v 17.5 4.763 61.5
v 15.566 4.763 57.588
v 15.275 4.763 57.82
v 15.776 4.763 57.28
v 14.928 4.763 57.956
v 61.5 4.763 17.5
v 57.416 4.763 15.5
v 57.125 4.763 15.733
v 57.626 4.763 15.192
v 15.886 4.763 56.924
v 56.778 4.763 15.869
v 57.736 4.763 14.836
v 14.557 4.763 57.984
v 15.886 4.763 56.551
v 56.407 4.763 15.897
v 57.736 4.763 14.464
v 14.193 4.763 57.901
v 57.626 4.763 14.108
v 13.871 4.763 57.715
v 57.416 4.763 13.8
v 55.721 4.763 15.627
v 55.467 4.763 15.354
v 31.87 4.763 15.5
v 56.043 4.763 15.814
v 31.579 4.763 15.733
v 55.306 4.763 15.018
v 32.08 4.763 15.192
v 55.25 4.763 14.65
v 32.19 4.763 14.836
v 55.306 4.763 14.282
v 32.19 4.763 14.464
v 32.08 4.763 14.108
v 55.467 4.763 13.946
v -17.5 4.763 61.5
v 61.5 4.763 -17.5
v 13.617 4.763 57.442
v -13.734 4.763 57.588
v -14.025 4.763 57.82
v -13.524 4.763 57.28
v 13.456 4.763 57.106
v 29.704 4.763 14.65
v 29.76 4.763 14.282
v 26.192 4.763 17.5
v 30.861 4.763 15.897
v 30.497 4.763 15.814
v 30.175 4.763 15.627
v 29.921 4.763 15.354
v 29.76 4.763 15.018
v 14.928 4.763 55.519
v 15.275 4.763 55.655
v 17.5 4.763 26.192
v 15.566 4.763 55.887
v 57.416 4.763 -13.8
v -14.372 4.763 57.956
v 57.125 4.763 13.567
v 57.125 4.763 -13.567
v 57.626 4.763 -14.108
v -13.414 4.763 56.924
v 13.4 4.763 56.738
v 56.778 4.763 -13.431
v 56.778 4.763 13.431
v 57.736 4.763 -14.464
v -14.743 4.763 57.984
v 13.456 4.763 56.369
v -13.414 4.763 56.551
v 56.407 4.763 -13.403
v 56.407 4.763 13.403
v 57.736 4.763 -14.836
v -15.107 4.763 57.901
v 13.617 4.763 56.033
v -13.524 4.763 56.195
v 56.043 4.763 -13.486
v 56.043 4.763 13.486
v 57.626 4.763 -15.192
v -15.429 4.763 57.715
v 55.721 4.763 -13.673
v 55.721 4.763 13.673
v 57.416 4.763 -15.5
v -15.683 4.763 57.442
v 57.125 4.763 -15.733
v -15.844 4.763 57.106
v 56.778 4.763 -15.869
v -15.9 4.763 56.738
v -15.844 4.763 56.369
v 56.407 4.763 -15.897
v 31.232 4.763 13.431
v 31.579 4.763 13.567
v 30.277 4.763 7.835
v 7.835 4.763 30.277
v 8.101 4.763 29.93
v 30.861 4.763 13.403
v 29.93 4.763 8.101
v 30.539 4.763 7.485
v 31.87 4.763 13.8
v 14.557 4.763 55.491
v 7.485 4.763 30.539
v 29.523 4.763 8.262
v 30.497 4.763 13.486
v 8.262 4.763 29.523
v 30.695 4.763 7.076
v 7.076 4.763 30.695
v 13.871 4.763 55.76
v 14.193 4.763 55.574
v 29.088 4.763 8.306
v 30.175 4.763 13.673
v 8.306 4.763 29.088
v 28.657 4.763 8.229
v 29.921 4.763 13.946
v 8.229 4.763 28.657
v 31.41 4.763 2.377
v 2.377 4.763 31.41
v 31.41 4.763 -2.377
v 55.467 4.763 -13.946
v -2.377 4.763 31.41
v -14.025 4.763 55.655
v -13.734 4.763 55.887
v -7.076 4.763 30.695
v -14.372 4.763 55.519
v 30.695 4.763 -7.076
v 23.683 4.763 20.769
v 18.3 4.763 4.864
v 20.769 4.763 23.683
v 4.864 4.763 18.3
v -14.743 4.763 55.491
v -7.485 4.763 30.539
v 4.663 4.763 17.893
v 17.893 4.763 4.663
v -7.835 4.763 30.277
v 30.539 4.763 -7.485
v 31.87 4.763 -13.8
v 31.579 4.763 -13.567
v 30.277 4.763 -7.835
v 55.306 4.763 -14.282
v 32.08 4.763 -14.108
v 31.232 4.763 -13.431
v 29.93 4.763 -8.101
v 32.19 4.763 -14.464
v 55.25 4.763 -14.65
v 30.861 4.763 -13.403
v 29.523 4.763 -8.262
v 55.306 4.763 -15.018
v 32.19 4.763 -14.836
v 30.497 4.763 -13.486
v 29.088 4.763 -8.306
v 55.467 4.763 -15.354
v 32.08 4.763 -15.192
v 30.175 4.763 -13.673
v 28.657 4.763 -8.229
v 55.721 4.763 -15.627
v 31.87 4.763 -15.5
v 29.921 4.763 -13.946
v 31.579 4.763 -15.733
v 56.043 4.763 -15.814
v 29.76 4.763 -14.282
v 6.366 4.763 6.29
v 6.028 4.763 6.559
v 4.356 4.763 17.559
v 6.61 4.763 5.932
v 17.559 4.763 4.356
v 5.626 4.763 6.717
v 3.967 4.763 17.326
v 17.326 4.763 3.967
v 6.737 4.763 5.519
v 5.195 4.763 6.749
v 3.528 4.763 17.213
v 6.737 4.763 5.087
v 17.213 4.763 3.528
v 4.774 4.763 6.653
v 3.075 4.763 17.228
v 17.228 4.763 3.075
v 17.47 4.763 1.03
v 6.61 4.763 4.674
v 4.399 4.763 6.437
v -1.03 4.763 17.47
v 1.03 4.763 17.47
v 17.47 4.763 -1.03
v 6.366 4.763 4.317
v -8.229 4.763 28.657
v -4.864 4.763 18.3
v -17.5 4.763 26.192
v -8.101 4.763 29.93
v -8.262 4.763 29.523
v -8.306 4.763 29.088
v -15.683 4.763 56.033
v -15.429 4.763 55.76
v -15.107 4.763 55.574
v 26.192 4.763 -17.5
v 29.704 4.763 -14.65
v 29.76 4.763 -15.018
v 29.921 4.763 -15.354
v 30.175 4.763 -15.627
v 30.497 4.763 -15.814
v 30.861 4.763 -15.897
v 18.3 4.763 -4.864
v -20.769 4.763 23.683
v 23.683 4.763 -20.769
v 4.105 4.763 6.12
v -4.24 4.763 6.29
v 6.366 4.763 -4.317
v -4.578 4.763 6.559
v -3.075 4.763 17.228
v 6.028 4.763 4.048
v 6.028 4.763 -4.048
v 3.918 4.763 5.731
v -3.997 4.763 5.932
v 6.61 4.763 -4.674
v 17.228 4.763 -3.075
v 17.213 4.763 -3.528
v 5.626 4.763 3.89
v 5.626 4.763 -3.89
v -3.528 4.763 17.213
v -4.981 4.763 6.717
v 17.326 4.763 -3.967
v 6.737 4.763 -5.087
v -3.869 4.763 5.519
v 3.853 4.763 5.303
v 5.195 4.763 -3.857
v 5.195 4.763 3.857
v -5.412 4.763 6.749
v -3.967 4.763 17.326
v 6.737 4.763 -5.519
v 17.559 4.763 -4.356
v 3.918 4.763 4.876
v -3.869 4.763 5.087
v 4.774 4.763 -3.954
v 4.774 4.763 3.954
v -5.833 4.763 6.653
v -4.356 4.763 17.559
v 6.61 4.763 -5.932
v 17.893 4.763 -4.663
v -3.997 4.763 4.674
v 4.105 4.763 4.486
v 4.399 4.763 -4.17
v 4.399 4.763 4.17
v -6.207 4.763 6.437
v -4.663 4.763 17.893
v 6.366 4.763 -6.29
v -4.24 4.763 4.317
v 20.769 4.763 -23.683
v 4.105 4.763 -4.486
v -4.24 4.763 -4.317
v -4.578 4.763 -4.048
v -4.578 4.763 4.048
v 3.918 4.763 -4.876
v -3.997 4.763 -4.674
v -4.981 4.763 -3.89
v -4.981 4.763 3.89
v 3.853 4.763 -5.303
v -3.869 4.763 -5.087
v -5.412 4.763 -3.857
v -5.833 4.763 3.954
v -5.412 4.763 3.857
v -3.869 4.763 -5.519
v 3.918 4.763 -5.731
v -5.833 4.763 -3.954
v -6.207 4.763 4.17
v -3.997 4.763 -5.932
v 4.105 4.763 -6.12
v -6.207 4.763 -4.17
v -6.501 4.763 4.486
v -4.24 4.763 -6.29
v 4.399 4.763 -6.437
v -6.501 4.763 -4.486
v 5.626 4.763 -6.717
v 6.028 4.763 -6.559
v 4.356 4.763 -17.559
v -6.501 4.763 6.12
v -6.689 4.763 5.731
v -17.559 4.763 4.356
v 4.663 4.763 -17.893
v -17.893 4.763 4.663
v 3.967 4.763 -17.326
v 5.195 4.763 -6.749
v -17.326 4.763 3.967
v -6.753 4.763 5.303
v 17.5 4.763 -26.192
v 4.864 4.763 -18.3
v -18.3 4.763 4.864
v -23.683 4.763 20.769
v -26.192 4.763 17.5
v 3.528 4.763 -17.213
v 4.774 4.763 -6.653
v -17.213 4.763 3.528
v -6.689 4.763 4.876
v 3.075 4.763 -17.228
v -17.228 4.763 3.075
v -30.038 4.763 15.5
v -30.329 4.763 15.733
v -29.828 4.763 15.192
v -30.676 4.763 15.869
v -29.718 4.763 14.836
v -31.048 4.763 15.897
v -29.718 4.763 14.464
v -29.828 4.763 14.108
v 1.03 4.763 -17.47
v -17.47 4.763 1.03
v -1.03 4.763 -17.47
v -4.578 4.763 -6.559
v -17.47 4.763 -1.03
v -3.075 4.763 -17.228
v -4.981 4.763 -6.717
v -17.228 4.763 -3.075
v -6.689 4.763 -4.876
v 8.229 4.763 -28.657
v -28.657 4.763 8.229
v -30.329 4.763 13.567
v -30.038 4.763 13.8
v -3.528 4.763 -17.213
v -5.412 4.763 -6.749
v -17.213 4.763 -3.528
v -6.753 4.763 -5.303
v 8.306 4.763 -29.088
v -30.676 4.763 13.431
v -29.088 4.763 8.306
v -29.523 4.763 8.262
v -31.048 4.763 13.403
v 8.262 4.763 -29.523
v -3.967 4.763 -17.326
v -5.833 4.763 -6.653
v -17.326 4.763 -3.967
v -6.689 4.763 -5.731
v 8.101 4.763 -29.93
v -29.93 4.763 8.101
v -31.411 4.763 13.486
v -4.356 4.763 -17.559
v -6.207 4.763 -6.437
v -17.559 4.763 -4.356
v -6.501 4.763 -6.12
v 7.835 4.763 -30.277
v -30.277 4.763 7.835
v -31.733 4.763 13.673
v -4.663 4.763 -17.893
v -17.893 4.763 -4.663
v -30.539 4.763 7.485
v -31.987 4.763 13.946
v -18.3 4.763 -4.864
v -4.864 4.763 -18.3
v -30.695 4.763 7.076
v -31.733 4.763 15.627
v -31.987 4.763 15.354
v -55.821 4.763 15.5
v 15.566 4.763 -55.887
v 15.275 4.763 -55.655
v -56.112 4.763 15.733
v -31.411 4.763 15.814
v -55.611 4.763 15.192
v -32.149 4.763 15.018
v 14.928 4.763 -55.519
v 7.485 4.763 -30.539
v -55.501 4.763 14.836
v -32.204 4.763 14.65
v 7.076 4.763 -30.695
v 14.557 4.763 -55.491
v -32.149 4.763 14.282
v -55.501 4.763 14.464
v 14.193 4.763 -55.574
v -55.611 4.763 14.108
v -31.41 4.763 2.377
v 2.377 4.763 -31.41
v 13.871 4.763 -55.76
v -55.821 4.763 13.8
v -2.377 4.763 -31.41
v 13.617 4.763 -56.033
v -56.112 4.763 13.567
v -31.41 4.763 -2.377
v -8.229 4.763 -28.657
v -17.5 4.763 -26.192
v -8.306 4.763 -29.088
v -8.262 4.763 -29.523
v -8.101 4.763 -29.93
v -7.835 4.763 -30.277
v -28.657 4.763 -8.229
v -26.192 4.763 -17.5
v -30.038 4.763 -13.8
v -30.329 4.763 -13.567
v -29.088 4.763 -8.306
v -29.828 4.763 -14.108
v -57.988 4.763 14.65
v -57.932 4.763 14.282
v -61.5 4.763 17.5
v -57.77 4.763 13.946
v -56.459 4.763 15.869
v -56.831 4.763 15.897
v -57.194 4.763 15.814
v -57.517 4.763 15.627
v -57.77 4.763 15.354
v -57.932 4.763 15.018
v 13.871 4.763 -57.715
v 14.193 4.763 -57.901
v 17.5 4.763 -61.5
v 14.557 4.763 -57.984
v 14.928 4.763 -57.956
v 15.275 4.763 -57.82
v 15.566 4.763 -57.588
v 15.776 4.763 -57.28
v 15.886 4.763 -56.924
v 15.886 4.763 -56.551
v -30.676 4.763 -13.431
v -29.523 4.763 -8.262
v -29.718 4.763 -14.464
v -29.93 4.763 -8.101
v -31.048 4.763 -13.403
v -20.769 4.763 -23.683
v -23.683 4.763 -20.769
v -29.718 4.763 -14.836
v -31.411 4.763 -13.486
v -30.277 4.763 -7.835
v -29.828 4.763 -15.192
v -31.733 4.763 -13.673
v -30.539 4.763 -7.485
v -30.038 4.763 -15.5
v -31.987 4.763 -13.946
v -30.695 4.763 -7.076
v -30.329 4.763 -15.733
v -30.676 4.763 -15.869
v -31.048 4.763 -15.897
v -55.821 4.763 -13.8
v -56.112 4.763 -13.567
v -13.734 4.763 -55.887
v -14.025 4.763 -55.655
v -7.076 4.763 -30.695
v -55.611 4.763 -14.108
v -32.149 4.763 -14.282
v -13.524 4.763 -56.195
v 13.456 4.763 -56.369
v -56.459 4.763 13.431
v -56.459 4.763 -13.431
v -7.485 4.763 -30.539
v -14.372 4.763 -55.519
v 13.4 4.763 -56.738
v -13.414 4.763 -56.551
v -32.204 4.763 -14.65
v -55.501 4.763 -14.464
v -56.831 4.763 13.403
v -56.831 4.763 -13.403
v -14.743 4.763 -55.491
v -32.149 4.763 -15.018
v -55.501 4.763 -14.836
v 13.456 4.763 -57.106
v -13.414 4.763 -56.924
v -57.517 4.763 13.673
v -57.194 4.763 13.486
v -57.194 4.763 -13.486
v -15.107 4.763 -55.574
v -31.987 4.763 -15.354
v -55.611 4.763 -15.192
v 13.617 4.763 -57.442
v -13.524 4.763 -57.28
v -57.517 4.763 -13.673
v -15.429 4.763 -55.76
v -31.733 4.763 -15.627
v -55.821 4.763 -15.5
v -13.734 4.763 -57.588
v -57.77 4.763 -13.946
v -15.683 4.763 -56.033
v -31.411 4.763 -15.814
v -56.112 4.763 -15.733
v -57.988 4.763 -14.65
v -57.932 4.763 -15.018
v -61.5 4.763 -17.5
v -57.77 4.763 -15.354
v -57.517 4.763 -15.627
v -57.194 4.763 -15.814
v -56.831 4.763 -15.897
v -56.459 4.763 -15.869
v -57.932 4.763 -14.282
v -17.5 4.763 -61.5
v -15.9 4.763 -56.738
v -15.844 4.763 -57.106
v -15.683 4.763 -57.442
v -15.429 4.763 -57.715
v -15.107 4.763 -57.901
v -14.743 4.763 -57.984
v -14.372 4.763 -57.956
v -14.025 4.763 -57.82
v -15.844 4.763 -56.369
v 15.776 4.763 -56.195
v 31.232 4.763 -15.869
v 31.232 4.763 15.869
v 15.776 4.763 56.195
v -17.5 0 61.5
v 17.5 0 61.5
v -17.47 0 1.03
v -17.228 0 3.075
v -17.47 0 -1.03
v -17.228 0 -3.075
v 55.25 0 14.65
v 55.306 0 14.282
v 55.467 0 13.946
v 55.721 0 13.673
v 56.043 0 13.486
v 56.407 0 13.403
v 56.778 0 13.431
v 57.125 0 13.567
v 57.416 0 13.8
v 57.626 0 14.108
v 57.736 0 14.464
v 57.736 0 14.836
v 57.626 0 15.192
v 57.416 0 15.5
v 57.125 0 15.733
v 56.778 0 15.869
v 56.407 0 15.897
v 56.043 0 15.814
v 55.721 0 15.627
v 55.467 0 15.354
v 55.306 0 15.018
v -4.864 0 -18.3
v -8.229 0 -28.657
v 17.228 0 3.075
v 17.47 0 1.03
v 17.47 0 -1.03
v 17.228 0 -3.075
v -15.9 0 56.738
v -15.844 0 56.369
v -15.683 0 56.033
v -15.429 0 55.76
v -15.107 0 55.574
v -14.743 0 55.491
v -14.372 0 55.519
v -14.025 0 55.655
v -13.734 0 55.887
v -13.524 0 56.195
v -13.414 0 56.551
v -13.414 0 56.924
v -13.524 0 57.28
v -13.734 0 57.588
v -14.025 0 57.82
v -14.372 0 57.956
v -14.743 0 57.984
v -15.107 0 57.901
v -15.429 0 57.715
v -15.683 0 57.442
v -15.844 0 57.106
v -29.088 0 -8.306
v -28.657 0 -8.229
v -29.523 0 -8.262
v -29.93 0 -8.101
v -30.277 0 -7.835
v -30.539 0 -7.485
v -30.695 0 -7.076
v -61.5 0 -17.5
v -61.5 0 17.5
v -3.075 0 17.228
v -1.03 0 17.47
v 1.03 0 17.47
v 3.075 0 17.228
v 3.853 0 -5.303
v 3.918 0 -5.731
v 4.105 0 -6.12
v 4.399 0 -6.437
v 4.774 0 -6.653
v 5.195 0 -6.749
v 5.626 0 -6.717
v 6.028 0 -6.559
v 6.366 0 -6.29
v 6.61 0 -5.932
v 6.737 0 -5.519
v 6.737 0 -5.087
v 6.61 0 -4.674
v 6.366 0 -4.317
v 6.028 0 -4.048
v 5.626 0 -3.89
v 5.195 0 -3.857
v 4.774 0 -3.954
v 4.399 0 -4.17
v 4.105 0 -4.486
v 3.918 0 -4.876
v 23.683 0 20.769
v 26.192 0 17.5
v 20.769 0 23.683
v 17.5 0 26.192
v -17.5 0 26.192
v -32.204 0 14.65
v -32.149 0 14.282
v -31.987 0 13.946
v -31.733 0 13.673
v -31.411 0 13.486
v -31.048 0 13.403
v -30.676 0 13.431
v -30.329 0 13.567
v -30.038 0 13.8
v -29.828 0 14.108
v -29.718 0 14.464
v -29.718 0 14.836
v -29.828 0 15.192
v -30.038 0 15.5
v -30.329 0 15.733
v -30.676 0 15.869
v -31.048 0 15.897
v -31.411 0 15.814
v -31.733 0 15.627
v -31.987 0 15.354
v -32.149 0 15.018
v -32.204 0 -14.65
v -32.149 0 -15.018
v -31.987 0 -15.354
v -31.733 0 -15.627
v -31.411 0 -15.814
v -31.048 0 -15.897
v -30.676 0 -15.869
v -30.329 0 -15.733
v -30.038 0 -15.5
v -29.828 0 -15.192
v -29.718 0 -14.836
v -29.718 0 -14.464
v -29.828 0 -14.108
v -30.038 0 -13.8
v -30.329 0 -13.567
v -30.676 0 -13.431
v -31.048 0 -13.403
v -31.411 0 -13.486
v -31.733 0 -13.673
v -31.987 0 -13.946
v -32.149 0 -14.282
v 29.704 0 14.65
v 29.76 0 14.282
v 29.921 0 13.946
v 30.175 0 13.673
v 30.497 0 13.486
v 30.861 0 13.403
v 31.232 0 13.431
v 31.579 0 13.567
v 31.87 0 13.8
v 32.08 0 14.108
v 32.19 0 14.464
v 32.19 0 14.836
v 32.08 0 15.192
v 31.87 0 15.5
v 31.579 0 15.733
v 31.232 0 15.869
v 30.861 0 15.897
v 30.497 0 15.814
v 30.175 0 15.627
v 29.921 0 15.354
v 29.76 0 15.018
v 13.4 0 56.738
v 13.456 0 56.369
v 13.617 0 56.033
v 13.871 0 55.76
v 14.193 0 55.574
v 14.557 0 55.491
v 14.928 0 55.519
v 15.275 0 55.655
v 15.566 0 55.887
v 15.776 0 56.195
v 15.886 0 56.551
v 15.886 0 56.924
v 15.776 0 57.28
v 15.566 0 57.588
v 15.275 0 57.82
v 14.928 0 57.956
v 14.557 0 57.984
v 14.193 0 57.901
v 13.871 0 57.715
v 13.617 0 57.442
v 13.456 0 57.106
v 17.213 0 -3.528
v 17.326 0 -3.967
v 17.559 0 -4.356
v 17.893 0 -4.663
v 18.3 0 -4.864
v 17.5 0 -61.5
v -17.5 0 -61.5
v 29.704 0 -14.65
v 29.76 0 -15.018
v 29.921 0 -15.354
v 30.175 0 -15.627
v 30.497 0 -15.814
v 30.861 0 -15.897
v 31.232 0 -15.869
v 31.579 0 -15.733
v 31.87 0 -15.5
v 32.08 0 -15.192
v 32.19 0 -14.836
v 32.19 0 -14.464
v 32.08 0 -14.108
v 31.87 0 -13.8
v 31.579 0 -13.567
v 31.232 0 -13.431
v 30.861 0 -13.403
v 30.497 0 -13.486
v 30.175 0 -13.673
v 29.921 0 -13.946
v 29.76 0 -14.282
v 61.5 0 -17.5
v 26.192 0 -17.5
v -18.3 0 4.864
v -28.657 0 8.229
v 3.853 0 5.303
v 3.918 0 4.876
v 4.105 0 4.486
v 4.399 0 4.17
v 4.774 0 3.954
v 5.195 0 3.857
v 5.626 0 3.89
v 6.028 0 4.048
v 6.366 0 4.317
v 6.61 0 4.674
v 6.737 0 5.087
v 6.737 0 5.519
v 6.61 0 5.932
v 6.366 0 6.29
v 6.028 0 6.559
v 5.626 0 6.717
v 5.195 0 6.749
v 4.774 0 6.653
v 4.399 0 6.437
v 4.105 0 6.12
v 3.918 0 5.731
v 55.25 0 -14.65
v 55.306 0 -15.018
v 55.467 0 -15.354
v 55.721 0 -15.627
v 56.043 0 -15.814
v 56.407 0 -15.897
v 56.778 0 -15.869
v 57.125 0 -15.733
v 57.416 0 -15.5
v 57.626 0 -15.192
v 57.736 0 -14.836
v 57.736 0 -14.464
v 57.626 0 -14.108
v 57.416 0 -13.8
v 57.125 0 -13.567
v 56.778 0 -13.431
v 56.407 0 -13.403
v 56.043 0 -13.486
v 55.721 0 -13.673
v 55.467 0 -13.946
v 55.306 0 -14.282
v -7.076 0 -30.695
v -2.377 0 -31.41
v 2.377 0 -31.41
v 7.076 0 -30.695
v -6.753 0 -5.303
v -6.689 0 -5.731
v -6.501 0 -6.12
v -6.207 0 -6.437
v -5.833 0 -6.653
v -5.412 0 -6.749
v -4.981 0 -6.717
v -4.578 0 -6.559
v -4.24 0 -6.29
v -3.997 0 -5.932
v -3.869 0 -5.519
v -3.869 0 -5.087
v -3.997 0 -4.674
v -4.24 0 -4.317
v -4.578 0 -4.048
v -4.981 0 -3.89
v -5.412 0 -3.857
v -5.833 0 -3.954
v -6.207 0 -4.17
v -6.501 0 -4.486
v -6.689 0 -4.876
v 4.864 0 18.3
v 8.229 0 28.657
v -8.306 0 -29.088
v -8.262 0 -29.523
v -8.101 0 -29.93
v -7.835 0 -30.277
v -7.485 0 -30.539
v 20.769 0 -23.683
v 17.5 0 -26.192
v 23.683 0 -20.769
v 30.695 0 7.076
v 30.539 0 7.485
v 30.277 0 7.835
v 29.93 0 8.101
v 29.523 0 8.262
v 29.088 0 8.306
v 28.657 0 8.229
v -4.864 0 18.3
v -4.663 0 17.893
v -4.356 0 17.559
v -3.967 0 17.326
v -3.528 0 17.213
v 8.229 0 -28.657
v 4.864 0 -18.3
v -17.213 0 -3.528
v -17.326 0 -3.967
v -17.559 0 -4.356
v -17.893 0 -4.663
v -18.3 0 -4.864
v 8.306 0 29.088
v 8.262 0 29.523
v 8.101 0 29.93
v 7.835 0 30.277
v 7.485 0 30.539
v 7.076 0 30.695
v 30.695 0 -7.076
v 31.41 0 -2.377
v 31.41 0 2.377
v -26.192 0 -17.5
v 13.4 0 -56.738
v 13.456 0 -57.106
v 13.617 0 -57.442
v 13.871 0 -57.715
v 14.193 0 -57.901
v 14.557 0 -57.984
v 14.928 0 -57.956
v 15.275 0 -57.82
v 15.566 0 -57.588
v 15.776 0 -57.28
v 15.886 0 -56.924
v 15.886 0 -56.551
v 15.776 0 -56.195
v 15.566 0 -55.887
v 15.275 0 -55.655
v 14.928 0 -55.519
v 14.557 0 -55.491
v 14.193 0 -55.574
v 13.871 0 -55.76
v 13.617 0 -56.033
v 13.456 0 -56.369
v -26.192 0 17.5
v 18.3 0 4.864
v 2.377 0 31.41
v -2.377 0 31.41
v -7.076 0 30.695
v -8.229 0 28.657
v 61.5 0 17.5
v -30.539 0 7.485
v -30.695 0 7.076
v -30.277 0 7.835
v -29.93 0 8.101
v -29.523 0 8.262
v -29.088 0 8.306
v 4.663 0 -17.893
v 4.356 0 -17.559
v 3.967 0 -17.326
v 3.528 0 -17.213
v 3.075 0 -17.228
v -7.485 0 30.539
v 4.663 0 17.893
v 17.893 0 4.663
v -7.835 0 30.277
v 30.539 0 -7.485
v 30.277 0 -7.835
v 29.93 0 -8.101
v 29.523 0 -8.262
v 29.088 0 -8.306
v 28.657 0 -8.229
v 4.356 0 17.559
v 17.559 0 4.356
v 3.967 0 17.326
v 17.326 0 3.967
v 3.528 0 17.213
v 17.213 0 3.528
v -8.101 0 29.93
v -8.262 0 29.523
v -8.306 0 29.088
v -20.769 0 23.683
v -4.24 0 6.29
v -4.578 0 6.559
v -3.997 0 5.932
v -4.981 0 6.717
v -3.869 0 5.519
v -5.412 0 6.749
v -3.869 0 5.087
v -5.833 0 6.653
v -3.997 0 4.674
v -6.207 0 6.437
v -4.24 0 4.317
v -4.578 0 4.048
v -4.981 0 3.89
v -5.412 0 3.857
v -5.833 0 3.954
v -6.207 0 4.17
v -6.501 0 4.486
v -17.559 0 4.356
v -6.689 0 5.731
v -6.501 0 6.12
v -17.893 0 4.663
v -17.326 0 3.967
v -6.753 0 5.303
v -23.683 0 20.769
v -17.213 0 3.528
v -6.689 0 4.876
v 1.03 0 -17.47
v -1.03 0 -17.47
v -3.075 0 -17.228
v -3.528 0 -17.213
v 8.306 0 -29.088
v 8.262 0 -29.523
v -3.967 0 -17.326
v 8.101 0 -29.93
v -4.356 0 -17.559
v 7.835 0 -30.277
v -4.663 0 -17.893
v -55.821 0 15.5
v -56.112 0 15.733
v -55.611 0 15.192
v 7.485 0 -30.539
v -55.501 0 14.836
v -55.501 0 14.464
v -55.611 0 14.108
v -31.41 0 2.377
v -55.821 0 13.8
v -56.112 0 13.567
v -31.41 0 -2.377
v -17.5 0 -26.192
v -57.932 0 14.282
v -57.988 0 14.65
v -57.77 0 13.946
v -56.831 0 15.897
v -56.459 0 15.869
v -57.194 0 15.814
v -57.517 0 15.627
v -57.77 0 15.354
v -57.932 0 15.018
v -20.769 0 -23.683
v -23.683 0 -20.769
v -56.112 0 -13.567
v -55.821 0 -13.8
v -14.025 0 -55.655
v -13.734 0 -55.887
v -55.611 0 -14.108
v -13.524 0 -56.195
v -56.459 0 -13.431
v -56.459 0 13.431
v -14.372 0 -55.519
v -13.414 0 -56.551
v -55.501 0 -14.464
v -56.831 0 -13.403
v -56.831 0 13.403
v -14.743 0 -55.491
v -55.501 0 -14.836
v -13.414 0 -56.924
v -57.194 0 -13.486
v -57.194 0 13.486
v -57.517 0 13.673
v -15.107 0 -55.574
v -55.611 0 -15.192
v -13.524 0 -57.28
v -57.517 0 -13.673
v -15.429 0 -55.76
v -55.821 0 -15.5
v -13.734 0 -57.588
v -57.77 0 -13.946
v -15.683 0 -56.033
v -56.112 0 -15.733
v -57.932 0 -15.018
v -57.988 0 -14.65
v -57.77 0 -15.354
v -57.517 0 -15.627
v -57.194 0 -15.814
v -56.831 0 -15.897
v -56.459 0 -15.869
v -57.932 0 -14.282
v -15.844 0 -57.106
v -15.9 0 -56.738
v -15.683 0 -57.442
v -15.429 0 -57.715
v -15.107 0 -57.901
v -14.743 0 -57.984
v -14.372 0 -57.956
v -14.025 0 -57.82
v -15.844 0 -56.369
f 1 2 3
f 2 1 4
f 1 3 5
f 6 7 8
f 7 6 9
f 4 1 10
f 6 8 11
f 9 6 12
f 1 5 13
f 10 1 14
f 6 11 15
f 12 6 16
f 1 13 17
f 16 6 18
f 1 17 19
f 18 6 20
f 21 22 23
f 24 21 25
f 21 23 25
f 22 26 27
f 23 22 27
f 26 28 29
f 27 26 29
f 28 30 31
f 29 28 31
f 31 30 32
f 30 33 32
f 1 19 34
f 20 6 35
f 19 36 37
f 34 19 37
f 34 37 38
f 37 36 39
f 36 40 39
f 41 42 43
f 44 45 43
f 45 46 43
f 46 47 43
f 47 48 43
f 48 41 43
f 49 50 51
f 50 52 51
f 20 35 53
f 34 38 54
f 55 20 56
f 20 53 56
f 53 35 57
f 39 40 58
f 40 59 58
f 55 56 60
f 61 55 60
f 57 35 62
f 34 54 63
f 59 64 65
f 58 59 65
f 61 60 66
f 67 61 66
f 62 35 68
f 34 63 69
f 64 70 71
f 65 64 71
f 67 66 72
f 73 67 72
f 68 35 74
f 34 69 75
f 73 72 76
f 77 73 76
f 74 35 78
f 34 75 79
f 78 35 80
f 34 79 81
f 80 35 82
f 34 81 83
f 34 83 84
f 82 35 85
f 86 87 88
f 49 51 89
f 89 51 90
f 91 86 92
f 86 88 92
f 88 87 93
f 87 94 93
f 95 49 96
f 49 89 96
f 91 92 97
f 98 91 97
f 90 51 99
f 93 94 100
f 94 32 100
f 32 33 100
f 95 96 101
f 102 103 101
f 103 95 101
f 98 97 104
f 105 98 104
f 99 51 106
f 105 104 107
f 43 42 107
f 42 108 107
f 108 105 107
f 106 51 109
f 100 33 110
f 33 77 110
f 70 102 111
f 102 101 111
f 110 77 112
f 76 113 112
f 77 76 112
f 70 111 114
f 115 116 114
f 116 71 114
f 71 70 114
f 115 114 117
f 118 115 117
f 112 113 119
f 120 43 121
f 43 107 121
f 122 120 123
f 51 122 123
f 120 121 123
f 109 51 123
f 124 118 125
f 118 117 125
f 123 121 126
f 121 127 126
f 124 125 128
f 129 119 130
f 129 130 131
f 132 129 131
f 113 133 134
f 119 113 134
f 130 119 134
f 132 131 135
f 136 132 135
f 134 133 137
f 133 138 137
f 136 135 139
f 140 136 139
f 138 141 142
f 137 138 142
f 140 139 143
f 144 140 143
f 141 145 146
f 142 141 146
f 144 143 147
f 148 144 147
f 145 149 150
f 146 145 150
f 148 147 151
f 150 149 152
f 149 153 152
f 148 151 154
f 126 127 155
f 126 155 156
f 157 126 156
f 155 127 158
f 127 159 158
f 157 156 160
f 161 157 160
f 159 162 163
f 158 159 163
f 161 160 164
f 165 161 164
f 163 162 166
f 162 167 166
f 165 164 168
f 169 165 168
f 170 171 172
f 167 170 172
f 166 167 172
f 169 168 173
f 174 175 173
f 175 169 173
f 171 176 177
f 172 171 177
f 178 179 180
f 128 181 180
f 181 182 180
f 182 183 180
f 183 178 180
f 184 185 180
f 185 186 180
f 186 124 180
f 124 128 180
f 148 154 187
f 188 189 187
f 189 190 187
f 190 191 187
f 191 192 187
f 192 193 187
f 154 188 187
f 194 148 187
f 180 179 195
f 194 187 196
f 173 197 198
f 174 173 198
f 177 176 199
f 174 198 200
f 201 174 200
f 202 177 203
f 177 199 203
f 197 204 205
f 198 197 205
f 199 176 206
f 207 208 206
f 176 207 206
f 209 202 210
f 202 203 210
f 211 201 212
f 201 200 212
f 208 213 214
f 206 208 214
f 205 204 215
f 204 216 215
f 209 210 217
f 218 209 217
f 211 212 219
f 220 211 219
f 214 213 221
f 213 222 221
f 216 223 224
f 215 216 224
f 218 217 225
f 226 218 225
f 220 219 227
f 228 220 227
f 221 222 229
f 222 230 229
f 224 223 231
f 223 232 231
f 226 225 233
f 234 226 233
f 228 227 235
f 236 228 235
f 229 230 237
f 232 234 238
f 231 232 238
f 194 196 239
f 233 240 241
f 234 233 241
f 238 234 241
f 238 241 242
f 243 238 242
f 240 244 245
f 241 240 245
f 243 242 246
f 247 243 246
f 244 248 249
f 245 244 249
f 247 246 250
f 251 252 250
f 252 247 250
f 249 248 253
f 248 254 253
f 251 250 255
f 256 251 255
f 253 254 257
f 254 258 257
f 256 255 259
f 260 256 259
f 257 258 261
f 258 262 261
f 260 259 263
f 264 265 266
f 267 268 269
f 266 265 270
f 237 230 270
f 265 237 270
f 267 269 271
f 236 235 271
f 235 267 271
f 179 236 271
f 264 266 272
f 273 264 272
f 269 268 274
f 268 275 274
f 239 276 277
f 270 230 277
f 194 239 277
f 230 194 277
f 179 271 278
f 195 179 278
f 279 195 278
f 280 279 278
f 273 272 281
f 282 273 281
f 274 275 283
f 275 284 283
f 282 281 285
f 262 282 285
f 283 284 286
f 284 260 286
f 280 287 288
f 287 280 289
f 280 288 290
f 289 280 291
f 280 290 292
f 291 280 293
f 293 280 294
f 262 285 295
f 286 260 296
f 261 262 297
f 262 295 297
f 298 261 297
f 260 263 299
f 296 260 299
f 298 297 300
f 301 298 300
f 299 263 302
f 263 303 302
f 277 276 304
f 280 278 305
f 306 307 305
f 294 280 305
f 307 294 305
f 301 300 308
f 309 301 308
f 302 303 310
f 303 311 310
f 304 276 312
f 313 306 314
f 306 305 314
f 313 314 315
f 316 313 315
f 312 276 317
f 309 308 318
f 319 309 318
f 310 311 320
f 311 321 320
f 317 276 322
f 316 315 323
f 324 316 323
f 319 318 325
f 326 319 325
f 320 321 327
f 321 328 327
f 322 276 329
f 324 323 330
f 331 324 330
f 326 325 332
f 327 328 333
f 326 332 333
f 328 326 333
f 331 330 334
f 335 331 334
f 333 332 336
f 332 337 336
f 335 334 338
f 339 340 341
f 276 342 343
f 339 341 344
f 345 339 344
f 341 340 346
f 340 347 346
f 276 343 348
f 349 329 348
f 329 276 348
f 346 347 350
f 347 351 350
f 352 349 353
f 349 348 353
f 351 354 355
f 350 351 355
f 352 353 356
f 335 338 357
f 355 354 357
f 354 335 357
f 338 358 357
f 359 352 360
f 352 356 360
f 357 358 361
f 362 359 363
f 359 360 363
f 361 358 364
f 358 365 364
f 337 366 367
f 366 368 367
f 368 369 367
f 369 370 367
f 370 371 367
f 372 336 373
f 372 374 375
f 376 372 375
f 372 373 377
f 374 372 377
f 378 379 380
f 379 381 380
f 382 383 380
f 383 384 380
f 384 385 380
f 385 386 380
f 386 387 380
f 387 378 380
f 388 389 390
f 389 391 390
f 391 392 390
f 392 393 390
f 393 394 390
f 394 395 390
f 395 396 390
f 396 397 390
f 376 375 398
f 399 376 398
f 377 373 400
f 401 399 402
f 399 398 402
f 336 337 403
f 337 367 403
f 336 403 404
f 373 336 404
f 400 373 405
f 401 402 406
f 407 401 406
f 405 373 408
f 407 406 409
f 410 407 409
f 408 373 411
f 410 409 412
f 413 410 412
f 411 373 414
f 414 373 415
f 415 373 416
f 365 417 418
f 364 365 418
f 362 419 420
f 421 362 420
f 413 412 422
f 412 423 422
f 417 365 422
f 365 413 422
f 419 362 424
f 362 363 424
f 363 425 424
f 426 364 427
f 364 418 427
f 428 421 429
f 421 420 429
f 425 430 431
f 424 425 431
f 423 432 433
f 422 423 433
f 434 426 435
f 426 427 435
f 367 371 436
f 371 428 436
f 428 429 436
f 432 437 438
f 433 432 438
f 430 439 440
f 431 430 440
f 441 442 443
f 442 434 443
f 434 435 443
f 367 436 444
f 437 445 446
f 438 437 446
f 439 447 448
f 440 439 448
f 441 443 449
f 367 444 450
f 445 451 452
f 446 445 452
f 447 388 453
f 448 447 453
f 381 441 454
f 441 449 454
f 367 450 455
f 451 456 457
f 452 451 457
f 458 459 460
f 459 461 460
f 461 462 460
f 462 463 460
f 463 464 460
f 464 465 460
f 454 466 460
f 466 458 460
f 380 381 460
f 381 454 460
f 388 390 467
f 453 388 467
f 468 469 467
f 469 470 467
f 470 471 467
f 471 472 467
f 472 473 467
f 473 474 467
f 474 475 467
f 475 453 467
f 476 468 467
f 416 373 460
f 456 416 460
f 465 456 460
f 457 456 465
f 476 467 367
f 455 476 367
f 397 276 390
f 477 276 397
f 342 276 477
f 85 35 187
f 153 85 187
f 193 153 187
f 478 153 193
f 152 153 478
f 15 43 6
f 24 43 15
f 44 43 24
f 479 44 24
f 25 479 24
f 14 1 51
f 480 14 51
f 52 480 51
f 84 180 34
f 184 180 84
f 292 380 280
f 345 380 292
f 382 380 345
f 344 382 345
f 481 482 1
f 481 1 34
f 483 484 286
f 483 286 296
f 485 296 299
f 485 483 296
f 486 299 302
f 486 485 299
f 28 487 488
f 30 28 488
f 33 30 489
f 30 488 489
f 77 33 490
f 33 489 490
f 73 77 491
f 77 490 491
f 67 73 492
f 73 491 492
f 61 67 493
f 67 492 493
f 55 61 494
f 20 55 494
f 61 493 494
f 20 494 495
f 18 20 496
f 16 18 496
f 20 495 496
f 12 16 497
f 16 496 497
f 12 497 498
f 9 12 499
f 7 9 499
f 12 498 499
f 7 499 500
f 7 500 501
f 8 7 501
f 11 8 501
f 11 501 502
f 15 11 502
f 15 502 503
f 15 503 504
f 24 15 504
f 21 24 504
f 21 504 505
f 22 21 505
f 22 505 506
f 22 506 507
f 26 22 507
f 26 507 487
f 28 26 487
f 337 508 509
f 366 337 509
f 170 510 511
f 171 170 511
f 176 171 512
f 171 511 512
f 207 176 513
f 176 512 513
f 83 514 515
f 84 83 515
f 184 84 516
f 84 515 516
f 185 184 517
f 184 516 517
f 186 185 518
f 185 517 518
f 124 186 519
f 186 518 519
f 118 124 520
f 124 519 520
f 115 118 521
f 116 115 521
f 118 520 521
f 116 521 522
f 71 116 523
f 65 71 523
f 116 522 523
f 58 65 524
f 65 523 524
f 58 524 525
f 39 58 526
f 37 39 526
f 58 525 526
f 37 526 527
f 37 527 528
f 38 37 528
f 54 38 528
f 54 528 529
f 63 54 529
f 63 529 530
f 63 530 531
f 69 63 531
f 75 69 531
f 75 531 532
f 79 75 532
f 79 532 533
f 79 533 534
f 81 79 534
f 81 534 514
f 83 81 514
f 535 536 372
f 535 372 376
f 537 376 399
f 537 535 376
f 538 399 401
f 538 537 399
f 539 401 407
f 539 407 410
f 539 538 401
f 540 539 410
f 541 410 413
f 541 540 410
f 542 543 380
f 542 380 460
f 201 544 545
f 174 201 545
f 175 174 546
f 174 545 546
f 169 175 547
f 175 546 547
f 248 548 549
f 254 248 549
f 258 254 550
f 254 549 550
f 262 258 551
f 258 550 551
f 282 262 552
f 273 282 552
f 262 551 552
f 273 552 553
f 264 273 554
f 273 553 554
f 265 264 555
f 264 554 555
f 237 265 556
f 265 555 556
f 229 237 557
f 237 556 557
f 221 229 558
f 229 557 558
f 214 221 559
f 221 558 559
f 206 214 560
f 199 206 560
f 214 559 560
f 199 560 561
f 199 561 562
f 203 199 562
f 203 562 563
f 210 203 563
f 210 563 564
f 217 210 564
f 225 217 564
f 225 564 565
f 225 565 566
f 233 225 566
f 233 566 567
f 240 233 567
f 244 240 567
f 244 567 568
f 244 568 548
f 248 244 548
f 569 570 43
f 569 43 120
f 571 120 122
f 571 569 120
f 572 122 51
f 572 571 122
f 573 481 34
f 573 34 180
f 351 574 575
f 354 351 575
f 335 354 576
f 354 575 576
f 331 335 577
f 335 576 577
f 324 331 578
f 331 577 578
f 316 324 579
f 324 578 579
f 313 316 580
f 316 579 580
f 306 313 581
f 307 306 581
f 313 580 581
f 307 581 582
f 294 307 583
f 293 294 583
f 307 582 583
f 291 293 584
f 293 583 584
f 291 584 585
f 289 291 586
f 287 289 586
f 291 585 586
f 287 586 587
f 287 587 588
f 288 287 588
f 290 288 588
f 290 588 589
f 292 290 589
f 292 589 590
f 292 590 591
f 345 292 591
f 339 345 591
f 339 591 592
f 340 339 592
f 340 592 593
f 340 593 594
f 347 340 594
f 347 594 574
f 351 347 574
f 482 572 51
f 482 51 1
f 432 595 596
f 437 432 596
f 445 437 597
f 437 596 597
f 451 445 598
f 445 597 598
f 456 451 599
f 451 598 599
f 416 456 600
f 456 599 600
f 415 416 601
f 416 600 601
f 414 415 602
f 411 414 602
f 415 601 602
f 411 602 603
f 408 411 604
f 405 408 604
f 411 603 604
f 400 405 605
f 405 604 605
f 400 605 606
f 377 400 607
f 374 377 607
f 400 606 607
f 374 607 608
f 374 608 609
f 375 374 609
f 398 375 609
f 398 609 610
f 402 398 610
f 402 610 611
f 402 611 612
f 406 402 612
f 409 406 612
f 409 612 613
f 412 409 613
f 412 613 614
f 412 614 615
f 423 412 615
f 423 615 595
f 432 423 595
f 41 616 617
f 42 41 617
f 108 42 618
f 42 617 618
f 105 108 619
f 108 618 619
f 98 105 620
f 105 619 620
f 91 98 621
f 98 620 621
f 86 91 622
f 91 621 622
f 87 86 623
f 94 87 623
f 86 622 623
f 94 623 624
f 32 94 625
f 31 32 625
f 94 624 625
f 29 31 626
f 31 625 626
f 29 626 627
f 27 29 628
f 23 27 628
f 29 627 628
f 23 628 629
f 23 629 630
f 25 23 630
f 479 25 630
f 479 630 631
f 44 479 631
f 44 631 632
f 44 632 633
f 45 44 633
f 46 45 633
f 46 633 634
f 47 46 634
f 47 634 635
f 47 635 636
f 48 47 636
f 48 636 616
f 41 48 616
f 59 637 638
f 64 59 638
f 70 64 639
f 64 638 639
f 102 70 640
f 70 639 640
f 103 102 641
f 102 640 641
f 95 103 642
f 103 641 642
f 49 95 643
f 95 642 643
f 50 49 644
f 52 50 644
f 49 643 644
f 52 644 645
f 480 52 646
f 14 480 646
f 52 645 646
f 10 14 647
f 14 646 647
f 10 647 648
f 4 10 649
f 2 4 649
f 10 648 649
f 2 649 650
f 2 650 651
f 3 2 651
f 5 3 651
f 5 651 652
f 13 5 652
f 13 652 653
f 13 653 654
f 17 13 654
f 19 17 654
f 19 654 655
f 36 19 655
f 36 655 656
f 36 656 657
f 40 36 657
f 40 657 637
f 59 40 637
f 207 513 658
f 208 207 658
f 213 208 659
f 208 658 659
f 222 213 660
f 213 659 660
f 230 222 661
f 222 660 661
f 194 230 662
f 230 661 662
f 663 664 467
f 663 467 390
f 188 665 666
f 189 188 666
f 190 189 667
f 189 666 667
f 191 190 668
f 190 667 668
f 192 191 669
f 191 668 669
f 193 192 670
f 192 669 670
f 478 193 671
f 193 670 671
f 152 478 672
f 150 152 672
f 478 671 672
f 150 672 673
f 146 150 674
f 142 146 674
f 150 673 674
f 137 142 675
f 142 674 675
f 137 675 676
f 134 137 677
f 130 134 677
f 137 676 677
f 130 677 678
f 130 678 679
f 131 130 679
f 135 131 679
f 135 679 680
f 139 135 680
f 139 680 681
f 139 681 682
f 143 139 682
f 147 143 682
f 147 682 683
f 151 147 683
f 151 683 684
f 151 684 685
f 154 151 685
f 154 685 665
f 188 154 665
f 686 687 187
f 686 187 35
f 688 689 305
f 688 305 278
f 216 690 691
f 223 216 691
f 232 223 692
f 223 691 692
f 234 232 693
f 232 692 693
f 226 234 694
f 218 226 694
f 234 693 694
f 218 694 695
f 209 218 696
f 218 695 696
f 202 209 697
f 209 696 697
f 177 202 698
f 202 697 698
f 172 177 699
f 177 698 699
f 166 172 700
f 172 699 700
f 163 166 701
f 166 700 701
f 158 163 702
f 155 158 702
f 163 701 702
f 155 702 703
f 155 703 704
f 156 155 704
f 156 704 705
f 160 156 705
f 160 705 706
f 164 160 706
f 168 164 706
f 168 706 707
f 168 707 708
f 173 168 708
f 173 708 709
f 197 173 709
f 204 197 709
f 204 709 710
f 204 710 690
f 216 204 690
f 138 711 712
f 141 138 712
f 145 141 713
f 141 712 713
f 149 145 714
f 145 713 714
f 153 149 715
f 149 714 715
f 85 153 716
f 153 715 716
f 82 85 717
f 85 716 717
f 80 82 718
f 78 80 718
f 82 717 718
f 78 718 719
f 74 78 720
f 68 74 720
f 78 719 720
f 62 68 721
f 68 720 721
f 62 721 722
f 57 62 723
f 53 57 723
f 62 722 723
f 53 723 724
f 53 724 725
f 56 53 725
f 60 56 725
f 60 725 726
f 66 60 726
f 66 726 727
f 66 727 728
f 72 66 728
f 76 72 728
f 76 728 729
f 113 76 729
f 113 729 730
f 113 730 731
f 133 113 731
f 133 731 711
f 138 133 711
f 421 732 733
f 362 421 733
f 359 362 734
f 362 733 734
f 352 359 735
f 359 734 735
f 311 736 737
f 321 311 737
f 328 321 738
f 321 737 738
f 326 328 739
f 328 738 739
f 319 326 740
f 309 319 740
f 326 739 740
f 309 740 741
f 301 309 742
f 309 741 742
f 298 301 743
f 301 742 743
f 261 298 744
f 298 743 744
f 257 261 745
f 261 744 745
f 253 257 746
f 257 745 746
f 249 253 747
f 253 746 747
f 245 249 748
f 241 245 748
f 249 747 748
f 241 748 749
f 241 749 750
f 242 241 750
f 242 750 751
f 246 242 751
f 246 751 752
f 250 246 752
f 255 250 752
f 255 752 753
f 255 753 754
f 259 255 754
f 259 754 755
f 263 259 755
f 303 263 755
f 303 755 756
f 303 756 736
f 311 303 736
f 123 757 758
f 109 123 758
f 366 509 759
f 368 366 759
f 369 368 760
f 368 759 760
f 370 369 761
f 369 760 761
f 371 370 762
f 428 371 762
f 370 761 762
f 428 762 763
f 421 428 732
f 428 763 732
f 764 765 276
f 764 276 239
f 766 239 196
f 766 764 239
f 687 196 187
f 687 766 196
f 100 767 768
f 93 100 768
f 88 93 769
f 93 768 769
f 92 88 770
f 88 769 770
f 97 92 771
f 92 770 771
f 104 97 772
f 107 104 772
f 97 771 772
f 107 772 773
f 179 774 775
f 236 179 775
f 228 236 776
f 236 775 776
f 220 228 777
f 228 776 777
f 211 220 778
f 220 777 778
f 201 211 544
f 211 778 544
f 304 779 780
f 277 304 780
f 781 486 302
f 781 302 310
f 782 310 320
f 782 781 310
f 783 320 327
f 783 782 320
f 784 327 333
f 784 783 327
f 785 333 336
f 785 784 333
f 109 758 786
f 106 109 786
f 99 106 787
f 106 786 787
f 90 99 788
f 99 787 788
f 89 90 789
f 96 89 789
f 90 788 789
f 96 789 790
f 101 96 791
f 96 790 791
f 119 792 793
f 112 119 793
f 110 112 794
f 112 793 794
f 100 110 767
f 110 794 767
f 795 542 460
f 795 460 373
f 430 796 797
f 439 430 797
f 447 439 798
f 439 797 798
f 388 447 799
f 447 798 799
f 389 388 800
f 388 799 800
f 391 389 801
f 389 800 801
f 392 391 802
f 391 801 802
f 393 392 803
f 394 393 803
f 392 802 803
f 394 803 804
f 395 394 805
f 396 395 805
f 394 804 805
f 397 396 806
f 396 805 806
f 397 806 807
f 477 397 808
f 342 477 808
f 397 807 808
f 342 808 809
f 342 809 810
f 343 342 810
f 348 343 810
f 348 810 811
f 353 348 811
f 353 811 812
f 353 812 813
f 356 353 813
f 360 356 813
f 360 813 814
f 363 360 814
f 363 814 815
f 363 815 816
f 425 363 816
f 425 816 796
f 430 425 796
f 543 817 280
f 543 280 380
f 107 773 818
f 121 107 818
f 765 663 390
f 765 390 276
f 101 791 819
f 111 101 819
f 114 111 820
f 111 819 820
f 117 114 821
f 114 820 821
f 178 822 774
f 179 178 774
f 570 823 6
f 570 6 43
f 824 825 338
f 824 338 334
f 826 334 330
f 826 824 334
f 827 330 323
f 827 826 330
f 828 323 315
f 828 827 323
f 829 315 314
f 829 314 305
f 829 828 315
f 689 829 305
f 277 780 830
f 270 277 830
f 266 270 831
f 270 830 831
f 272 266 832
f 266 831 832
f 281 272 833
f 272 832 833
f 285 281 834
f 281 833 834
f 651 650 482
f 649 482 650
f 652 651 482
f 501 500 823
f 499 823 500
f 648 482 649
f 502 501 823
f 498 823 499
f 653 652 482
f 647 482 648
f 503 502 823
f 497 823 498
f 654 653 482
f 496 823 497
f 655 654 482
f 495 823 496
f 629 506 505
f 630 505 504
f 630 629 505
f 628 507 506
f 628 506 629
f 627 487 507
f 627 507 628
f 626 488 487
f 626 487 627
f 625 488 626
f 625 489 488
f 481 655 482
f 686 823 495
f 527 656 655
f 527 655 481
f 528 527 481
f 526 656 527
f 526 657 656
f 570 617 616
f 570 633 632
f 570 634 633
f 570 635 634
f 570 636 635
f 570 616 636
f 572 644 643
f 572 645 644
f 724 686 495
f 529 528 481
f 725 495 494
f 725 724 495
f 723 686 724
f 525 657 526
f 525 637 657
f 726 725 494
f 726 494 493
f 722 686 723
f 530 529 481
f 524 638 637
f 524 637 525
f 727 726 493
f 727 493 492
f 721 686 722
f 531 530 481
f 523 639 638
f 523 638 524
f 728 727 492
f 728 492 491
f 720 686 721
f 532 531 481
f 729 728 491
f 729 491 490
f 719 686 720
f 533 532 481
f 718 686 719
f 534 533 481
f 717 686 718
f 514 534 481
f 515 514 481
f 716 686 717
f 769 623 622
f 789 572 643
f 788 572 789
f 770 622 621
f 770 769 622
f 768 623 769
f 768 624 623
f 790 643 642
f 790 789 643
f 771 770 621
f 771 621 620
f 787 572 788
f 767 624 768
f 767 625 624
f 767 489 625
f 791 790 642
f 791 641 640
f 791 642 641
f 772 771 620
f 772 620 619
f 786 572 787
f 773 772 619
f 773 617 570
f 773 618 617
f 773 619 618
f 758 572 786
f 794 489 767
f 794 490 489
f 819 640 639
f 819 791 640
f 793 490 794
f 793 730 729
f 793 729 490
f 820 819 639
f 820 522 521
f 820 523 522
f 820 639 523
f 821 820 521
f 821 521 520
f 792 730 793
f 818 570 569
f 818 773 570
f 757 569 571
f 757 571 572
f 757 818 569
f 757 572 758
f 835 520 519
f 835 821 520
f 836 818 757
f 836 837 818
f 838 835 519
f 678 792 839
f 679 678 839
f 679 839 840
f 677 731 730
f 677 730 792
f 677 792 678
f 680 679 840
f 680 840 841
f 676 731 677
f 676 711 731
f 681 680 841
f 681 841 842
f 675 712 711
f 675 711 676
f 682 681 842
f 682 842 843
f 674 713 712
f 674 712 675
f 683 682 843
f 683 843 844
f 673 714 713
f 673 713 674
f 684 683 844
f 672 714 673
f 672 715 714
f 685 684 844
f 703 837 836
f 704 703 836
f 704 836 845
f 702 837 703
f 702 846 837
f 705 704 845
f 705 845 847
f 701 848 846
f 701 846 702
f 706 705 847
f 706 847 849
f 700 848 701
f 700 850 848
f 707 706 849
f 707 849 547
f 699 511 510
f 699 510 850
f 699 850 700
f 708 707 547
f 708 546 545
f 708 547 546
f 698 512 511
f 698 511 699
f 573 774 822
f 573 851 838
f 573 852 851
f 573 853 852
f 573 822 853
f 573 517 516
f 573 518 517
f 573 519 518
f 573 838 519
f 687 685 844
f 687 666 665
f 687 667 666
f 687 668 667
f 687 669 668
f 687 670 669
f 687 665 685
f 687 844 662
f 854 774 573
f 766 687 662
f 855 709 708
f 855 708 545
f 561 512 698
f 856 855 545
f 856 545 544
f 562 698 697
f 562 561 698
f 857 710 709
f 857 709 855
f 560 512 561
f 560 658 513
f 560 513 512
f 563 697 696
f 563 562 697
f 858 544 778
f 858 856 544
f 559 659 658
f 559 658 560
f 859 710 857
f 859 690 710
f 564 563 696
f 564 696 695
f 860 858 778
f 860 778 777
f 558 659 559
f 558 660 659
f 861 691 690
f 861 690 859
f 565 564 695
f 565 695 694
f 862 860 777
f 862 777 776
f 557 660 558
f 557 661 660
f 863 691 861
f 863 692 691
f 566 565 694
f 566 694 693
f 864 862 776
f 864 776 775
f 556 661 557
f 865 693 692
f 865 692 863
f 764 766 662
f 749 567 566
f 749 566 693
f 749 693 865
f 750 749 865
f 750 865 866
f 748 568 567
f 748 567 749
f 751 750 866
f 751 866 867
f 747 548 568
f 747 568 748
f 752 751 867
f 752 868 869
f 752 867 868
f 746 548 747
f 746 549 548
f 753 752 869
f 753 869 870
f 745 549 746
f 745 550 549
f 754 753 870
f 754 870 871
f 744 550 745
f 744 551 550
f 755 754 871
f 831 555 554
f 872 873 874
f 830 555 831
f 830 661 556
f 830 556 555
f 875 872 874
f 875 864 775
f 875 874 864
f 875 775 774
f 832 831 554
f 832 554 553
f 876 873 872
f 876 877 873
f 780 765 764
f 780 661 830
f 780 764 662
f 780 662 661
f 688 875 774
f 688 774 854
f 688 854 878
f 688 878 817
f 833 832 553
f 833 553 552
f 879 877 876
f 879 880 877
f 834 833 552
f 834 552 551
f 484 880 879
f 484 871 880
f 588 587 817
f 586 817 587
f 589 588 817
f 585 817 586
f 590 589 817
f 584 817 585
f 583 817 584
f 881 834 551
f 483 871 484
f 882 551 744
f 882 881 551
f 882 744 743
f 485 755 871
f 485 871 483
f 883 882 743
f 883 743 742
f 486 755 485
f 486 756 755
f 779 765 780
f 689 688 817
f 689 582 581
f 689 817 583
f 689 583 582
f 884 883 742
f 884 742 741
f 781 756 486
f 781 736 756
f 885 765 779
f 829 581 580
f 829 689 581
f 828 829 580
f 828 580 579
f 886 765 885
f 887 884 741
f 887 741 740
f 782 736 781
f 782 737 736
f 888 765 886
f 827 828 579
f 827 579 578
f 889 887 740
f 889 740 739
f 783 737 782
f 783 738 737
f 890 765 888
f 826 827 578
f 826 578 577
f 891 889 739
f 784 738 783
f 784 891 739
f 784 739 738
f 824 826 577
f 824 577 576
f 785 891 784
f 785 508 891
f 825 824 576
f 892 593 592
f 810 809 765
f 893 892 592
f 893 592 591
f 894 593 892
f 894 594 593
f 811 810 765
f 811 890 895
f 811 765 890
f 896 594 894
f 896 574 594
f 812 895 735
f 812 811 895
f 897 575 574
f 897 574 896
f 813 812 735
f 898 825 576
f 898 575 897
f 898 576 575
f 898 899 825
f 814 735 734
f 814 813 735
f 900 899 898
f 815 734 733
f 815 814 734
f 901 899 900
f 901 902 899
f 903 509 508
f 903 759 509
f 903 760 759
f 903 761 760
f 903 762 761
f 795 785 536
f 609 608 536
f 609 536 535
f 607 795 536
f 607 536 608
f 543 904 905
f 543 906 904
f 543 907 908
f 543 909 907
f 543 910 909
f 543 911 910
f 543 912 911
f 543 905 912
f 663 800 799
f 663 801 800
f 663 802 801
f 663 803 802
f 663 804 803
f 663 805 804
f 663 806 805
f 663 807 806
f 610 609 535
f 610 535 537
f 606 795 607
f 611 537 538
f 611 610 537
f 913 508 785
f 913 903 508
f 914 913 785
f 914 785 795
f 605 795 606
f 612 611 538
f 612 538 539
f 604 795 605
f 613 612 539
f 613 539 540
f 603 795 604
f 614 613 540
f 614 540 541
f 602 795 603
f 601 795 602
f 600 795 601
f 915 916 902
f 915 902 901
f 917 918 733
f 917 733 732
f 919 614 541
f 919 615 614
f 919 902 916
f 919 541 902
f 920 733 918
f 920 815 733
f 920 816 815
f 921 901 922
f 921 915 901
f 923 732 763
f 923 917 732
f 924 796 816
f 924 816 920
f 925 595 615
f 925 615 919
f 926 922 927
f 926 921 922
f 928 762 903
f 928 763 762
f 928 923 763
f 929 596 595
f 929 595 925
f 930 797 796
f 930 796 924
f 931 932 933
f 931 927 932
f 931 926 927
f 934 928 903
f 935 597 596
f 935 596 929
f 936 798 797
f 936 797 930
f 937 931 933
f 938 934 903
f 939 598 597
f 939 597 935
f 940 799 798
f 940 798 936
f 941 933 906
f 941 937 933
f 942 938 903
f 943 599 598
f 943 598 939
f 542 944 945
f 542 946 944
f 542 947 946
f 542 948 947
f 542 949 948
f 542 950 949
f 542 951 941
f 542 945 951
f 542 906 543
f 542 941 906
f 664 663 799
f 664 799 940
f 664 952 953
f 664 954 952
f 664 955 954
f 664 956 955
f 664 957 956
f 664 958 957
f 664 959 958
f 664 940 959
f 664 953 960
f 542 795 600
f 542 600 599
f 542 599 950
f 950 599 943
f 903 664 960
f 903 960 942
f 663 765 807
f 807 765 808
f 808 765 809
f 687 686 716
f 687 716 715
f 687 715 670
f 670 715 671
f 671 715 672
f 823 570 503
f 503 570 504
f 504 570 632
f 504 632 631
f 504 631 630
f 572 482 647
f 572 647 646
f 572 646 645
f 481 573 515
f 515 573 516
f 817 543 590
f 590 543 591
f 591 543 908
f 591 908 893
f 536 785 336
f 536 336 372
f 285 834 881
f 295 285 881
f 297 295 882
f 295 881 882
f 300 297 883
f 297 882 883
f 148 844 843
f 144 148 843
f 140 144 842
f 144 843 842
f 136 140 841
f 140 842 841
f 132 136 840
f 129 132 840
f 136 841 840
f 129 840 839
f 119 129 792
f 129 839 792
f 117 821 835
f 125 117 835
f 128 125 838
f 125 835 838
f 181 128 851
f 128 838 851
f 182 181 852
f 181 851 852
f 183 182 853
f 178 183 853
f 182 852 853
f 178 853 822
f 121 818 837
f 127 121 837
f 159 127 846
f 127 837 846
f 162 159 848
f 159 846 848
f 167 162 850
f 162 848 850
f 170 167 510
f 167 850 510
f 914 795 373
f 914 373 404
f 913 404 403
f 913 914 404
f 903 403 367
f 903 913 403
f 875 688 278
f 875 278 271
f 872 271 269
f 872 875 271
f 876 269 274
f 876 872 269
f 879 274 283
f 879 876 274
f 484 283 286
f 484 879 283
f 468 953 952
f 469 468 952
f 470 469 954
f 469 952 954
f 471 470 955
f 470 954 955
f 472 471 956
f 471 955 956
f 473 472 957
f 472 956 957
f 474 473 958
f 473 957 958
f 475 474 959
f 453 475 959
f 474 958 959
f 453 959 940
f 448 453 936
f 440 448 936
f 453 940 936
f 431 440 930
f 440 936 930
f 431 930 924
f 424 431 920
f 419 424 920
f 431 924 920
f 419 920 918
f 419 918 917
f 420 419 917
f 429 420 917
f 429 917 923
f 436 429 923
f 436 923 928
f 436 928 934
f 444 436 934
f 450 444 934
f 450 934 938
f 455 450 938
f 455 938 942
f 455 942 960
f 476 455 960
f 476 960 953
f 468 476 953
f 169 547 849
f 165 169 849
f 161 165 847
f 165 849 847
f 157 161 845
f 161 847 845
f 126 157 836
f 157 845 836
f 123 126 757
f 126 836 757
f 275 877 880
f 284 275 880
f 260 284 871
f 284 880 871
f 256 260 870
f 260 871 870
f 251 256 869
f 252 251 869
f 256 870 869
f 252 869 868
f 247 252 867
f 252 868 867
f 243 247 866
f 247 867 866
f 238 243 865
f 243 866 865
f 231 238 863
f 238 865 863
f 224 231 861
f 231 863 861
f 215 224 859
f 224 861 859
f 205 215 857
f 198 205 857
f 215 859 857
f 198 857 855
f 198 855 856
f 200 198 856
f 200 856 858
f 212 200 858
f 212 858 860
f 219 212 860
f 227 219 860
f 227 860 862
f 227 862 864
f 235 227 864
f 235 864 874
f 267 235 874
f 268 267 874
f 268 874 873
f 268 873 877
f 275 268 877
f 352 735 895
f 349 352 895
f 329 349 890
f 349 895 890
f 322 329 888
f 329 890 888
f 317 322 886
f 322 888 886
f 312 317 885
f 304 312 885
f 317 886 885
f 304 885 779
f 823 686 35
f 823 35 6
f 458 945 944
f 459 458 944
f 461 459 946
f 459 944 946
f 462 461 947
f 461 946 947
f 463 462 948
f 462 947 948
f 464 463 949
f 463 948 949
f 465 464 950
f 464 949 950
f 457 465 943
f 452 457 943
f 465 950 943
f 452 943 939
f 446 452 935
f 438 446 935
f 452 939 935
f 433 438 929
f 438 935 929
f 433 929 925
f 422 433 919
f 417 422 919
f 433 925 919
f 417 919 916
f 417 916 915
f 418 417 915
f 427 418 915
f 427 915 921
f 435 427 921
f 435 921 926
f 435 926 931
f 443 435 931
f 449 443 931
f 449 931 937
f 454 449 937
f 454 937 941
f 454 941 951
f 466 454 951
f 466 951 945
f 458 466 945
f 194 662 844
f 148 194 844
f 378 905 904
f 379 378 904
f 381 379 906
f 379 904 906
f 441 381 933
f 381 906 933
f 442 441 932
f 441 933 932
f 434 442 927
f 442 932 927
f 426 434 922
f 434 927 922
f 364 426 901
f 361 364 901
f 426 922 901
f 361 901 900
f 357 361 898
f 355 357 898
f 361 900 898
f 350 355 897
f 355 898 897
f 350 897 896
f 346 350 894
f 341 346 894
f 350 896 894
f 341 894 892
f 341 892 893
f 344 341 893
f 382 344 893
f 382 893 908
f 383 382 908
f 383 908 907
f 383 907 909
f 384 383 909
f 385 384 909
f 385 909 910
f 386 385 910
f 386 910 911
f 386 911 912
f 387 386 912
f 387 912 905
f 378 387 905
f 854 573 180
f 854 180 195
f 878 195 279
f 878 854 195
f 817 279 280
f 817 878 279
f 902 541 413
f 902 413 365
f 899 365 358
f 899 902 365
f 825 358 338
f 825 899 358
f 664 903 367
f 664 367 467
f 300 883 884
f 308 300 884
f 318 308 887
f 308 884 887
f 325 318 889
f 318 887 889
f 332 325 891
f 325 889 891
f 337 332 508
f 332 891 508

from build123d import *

# Parameters (mm, degrees)
BOSS_EXTRUDE1_DEPTH             = 4.763
M2_5_CLEARANCE_HOLE1_D          = 2.9
TAP_DRILL_FOR_M3X0_5_TAP1_D     = 2.5
TAP_DRILL_FOR_M3X0_5_TAP1_DEPTH = 4.763


with BuildPart() as part:
    # Sketch1 → Boss-Extrude1 (new body)
    with BuildSketch(Plane(origin=(0, 0, 0), x_dir=(1, 0, 0), z_dir=(0, 1, 0))):
        with BuildLine():
            Line((-61.5, 17.5), (-26.191601707, 17.5))
            ThreePointArc((-26.191601707, 17.5), (-22.273863607, 22.273863607), (-17.5, 26.191601707))
            Line((-17.5, 26.191601707), (-17.5, 61.5))
            Line((-17.5, 61.5), (17.5, 61.5))
            Line((17.5, 61.5), (17.5, 26.191601707))
            ThreePointArc((17.5, 26.191601707), (22.273863607, 22.273863607), (26.191601707, 17.5))
            Line((26.191601707, 17.5), (61.5, 17.5))
            Line((61.5, 17.5), (61.5, -17.5))
            Line((61.5, -17.5), (26.191601707, -17.5))
            ThreePointArc((26.191601707, -17.5), (22.273863607, -22.273863607), (17.5, -26.191601707))
            Line((17.5, -26.191601707), (17.5, -61.5))
            Line((17.5, -61.5), (-17.5, -61.5))
            Line((-17.5, -61.5), (-17.5, -26.191601707))
            ThreePointArc((-17.5, -26.191601707), (-22.273863607, -22.273863607), (-26.191601707, -17.5))
            Line((-26.191601707, -17.5), (-61.5, -17.5))
            Line((-61.5, -17.5), (-61.5, 17.5))
        make_face()
        with BuildLine():
            Line((-18.299951333, 4.863661227), (-28.657445997, 8.22916814))
            ThreePointArc((-28.657445997, 8.22916814), (-29.929968402, 8.100940268), (-30.69495913, 7.075979368))
            ThreePointArc((-30.69495913, 7.075979368), (-31.5, 0), (-30.69495913, -7.075979368))
            ThreePointArc((-30.69495913, -7.075979368), (-29.929968402, -8.100940268), (-28.657445997, -8.22916814))
            Line((-28.657445997, -8.22916814), (-18.299951333, -4.863661227))
            ThreePointArc((-18.299951333, -4.863661227), (-17.4289221, -4.170054209), (-17.227734354, -3.074925855))
            ThreePointArc((-17.227734354, -3.074925855), (-17.5, 0), (-17.227734354, 3.074925855))
            ThreePointArc((-17.227734354, 3.074925855), (-17.4289221, 4.170054209), (-18.299951333, 4.863661227))
        make_face(mode=Mode.SUBTRACT)
        with BuildLine():
            Line((-4.863661227, 18.299951333), (-8.22916814, 28.657445997))
            ThreePointArc((-8.22916814, 28.657445997), (-8.100940268, 29.929968402), (-7.075979368, 30.69495913))
            ThreePointArc((-7.075979368, 30.69495913), (0, 31.5), (7.075979368, 30.69495913))
            ThreePointArc((7.075979368, 30.69495913), (8.100940268, 29.929968402), (8.22916814, 28.657445997))
            Line((8.22916814, 28.657445997), (4.863661227, 18.299951333))
            ThreePointArc((4.863661227, 18.299951333), (4.170054209, 17.4289221), (3.074925855, 17.227734354))
            ThreePointArc((3.074925855, 17.227734354), (0, 17.5), (-3.074925855, 17.227734354))
            ThreePointArc((-3.074925855, 17.227734354), (-4.170054209, 17.4289221), (-4.863661227, 18.299951333))
        make_face(mode=Mode.SUBTRACT)
        with BuildLine():
            Line((18.299951333, 4.863661227), (28.657445997, 8.22916814))
            ThreePointArc((28.657445997, 8.22916814), (29.929968402, 8.100940268), (30.69495913, 7.075979368))
            ThreePointArc((30.69495913, 7.075979368), (31.5, 0), (30.69495913, -7.075979368))
            ThreePointArc((30.69495913, -7.075979368), (29.929968402, -8.100940268), (28.657445997, -8.22916814))
            Line((28.657445997, -8.22916814), (18.299951333, -4.863661227))
            ThreePointArc((18.299951333, -4.863661227), (17.4289221, -4.170054209), (17.227734354, -3.074925855))
            ThreePointArc((17.227734354, -3.074925855), (17.5, 0), (17.227734354, 3.074925855))
            ThreePointArc((17.227734354, 3.074925855), (17.4289221, 4.170054209), (18.299951333, 4.863661227))
        make_face(mode=Mode.SUBTRACT)
        with BuildLine():
            Line((4.863661227, -18.299951333), (8.22916814, -28.657445997))
            ThreePointArc((8.22916814, -28.657445997), (8.100940268, -29.929968402), (7.075979368, -30.69495913))
            ThreePointArc((7.075979368, -30.69495913), (0, -31.5), (-7.075979368, -30.69495913))
            ThreePointArc((-7.075979368, -30.69495913), (-8.100940268, -29.929968402), (-8.22916814, -28.657445997))
            Line((-8.22916814, -28.657445997), (-4.863661227, -18.299951333))
            ThreePointArc((-4.863661227, -18.299951333), (-4.170054209, -17.4289221), (-3.074925855, -17.227734354))
            ThreePointArc((-3.074925855, -17.227734354), (0, -17.5), (3.074925855, -17.227734354))
            ThreePointArc((3.074925855, -17.227734354), (4.170054209, -17.4289221), (4.863661227, -18.299951333))
        make_face(mode=Mode.SUBTRACT)
    extrude(amount=BOSS_EXTRUDE1_DEPTH)

    # M2.5 Clearance Hole1 (through all)
    with Locations(Plane(origin=(0, 4.763, 0), x_dir=(1, 0, 0), z_dir=(0, 1, 0))):
        with Locations((5.303300859, 5.303300859), (-5.303300859, 5.303300859), (-5.303300859, -5.303300859), (5.303300859, -5.303300859)):
            Hole(M2_5_CLEARANCE_HOLE1_D / 2)

    # Tap Drill for M3x0.5 Tap1
    with Locations(Plane(origin=(0, 4.763, 0), x_dir=(1, 0, 0), z_dir=(0, 1, 0))):
        with Locations((-56.7375, 14.65), (-30.954101707, 14.65), (-56.7375, -14.65), (30.954101707, 14.65), (56.5, 14.65), (-30.954101707, -14.65), (30.954101707, -14.65), (56.5, -14.65), (-14.65, 56.7375), (14.65, 56.7375), (-14.65, -56.7375), (14.65, -56.7375)):
            Hole(TAP_DRILL_FOR_M3X0_5_TAP1_D / 2, depth=TAP_DRILL_FOR_M3X0_5_TAP1_DEPTH)


solid = part.part
